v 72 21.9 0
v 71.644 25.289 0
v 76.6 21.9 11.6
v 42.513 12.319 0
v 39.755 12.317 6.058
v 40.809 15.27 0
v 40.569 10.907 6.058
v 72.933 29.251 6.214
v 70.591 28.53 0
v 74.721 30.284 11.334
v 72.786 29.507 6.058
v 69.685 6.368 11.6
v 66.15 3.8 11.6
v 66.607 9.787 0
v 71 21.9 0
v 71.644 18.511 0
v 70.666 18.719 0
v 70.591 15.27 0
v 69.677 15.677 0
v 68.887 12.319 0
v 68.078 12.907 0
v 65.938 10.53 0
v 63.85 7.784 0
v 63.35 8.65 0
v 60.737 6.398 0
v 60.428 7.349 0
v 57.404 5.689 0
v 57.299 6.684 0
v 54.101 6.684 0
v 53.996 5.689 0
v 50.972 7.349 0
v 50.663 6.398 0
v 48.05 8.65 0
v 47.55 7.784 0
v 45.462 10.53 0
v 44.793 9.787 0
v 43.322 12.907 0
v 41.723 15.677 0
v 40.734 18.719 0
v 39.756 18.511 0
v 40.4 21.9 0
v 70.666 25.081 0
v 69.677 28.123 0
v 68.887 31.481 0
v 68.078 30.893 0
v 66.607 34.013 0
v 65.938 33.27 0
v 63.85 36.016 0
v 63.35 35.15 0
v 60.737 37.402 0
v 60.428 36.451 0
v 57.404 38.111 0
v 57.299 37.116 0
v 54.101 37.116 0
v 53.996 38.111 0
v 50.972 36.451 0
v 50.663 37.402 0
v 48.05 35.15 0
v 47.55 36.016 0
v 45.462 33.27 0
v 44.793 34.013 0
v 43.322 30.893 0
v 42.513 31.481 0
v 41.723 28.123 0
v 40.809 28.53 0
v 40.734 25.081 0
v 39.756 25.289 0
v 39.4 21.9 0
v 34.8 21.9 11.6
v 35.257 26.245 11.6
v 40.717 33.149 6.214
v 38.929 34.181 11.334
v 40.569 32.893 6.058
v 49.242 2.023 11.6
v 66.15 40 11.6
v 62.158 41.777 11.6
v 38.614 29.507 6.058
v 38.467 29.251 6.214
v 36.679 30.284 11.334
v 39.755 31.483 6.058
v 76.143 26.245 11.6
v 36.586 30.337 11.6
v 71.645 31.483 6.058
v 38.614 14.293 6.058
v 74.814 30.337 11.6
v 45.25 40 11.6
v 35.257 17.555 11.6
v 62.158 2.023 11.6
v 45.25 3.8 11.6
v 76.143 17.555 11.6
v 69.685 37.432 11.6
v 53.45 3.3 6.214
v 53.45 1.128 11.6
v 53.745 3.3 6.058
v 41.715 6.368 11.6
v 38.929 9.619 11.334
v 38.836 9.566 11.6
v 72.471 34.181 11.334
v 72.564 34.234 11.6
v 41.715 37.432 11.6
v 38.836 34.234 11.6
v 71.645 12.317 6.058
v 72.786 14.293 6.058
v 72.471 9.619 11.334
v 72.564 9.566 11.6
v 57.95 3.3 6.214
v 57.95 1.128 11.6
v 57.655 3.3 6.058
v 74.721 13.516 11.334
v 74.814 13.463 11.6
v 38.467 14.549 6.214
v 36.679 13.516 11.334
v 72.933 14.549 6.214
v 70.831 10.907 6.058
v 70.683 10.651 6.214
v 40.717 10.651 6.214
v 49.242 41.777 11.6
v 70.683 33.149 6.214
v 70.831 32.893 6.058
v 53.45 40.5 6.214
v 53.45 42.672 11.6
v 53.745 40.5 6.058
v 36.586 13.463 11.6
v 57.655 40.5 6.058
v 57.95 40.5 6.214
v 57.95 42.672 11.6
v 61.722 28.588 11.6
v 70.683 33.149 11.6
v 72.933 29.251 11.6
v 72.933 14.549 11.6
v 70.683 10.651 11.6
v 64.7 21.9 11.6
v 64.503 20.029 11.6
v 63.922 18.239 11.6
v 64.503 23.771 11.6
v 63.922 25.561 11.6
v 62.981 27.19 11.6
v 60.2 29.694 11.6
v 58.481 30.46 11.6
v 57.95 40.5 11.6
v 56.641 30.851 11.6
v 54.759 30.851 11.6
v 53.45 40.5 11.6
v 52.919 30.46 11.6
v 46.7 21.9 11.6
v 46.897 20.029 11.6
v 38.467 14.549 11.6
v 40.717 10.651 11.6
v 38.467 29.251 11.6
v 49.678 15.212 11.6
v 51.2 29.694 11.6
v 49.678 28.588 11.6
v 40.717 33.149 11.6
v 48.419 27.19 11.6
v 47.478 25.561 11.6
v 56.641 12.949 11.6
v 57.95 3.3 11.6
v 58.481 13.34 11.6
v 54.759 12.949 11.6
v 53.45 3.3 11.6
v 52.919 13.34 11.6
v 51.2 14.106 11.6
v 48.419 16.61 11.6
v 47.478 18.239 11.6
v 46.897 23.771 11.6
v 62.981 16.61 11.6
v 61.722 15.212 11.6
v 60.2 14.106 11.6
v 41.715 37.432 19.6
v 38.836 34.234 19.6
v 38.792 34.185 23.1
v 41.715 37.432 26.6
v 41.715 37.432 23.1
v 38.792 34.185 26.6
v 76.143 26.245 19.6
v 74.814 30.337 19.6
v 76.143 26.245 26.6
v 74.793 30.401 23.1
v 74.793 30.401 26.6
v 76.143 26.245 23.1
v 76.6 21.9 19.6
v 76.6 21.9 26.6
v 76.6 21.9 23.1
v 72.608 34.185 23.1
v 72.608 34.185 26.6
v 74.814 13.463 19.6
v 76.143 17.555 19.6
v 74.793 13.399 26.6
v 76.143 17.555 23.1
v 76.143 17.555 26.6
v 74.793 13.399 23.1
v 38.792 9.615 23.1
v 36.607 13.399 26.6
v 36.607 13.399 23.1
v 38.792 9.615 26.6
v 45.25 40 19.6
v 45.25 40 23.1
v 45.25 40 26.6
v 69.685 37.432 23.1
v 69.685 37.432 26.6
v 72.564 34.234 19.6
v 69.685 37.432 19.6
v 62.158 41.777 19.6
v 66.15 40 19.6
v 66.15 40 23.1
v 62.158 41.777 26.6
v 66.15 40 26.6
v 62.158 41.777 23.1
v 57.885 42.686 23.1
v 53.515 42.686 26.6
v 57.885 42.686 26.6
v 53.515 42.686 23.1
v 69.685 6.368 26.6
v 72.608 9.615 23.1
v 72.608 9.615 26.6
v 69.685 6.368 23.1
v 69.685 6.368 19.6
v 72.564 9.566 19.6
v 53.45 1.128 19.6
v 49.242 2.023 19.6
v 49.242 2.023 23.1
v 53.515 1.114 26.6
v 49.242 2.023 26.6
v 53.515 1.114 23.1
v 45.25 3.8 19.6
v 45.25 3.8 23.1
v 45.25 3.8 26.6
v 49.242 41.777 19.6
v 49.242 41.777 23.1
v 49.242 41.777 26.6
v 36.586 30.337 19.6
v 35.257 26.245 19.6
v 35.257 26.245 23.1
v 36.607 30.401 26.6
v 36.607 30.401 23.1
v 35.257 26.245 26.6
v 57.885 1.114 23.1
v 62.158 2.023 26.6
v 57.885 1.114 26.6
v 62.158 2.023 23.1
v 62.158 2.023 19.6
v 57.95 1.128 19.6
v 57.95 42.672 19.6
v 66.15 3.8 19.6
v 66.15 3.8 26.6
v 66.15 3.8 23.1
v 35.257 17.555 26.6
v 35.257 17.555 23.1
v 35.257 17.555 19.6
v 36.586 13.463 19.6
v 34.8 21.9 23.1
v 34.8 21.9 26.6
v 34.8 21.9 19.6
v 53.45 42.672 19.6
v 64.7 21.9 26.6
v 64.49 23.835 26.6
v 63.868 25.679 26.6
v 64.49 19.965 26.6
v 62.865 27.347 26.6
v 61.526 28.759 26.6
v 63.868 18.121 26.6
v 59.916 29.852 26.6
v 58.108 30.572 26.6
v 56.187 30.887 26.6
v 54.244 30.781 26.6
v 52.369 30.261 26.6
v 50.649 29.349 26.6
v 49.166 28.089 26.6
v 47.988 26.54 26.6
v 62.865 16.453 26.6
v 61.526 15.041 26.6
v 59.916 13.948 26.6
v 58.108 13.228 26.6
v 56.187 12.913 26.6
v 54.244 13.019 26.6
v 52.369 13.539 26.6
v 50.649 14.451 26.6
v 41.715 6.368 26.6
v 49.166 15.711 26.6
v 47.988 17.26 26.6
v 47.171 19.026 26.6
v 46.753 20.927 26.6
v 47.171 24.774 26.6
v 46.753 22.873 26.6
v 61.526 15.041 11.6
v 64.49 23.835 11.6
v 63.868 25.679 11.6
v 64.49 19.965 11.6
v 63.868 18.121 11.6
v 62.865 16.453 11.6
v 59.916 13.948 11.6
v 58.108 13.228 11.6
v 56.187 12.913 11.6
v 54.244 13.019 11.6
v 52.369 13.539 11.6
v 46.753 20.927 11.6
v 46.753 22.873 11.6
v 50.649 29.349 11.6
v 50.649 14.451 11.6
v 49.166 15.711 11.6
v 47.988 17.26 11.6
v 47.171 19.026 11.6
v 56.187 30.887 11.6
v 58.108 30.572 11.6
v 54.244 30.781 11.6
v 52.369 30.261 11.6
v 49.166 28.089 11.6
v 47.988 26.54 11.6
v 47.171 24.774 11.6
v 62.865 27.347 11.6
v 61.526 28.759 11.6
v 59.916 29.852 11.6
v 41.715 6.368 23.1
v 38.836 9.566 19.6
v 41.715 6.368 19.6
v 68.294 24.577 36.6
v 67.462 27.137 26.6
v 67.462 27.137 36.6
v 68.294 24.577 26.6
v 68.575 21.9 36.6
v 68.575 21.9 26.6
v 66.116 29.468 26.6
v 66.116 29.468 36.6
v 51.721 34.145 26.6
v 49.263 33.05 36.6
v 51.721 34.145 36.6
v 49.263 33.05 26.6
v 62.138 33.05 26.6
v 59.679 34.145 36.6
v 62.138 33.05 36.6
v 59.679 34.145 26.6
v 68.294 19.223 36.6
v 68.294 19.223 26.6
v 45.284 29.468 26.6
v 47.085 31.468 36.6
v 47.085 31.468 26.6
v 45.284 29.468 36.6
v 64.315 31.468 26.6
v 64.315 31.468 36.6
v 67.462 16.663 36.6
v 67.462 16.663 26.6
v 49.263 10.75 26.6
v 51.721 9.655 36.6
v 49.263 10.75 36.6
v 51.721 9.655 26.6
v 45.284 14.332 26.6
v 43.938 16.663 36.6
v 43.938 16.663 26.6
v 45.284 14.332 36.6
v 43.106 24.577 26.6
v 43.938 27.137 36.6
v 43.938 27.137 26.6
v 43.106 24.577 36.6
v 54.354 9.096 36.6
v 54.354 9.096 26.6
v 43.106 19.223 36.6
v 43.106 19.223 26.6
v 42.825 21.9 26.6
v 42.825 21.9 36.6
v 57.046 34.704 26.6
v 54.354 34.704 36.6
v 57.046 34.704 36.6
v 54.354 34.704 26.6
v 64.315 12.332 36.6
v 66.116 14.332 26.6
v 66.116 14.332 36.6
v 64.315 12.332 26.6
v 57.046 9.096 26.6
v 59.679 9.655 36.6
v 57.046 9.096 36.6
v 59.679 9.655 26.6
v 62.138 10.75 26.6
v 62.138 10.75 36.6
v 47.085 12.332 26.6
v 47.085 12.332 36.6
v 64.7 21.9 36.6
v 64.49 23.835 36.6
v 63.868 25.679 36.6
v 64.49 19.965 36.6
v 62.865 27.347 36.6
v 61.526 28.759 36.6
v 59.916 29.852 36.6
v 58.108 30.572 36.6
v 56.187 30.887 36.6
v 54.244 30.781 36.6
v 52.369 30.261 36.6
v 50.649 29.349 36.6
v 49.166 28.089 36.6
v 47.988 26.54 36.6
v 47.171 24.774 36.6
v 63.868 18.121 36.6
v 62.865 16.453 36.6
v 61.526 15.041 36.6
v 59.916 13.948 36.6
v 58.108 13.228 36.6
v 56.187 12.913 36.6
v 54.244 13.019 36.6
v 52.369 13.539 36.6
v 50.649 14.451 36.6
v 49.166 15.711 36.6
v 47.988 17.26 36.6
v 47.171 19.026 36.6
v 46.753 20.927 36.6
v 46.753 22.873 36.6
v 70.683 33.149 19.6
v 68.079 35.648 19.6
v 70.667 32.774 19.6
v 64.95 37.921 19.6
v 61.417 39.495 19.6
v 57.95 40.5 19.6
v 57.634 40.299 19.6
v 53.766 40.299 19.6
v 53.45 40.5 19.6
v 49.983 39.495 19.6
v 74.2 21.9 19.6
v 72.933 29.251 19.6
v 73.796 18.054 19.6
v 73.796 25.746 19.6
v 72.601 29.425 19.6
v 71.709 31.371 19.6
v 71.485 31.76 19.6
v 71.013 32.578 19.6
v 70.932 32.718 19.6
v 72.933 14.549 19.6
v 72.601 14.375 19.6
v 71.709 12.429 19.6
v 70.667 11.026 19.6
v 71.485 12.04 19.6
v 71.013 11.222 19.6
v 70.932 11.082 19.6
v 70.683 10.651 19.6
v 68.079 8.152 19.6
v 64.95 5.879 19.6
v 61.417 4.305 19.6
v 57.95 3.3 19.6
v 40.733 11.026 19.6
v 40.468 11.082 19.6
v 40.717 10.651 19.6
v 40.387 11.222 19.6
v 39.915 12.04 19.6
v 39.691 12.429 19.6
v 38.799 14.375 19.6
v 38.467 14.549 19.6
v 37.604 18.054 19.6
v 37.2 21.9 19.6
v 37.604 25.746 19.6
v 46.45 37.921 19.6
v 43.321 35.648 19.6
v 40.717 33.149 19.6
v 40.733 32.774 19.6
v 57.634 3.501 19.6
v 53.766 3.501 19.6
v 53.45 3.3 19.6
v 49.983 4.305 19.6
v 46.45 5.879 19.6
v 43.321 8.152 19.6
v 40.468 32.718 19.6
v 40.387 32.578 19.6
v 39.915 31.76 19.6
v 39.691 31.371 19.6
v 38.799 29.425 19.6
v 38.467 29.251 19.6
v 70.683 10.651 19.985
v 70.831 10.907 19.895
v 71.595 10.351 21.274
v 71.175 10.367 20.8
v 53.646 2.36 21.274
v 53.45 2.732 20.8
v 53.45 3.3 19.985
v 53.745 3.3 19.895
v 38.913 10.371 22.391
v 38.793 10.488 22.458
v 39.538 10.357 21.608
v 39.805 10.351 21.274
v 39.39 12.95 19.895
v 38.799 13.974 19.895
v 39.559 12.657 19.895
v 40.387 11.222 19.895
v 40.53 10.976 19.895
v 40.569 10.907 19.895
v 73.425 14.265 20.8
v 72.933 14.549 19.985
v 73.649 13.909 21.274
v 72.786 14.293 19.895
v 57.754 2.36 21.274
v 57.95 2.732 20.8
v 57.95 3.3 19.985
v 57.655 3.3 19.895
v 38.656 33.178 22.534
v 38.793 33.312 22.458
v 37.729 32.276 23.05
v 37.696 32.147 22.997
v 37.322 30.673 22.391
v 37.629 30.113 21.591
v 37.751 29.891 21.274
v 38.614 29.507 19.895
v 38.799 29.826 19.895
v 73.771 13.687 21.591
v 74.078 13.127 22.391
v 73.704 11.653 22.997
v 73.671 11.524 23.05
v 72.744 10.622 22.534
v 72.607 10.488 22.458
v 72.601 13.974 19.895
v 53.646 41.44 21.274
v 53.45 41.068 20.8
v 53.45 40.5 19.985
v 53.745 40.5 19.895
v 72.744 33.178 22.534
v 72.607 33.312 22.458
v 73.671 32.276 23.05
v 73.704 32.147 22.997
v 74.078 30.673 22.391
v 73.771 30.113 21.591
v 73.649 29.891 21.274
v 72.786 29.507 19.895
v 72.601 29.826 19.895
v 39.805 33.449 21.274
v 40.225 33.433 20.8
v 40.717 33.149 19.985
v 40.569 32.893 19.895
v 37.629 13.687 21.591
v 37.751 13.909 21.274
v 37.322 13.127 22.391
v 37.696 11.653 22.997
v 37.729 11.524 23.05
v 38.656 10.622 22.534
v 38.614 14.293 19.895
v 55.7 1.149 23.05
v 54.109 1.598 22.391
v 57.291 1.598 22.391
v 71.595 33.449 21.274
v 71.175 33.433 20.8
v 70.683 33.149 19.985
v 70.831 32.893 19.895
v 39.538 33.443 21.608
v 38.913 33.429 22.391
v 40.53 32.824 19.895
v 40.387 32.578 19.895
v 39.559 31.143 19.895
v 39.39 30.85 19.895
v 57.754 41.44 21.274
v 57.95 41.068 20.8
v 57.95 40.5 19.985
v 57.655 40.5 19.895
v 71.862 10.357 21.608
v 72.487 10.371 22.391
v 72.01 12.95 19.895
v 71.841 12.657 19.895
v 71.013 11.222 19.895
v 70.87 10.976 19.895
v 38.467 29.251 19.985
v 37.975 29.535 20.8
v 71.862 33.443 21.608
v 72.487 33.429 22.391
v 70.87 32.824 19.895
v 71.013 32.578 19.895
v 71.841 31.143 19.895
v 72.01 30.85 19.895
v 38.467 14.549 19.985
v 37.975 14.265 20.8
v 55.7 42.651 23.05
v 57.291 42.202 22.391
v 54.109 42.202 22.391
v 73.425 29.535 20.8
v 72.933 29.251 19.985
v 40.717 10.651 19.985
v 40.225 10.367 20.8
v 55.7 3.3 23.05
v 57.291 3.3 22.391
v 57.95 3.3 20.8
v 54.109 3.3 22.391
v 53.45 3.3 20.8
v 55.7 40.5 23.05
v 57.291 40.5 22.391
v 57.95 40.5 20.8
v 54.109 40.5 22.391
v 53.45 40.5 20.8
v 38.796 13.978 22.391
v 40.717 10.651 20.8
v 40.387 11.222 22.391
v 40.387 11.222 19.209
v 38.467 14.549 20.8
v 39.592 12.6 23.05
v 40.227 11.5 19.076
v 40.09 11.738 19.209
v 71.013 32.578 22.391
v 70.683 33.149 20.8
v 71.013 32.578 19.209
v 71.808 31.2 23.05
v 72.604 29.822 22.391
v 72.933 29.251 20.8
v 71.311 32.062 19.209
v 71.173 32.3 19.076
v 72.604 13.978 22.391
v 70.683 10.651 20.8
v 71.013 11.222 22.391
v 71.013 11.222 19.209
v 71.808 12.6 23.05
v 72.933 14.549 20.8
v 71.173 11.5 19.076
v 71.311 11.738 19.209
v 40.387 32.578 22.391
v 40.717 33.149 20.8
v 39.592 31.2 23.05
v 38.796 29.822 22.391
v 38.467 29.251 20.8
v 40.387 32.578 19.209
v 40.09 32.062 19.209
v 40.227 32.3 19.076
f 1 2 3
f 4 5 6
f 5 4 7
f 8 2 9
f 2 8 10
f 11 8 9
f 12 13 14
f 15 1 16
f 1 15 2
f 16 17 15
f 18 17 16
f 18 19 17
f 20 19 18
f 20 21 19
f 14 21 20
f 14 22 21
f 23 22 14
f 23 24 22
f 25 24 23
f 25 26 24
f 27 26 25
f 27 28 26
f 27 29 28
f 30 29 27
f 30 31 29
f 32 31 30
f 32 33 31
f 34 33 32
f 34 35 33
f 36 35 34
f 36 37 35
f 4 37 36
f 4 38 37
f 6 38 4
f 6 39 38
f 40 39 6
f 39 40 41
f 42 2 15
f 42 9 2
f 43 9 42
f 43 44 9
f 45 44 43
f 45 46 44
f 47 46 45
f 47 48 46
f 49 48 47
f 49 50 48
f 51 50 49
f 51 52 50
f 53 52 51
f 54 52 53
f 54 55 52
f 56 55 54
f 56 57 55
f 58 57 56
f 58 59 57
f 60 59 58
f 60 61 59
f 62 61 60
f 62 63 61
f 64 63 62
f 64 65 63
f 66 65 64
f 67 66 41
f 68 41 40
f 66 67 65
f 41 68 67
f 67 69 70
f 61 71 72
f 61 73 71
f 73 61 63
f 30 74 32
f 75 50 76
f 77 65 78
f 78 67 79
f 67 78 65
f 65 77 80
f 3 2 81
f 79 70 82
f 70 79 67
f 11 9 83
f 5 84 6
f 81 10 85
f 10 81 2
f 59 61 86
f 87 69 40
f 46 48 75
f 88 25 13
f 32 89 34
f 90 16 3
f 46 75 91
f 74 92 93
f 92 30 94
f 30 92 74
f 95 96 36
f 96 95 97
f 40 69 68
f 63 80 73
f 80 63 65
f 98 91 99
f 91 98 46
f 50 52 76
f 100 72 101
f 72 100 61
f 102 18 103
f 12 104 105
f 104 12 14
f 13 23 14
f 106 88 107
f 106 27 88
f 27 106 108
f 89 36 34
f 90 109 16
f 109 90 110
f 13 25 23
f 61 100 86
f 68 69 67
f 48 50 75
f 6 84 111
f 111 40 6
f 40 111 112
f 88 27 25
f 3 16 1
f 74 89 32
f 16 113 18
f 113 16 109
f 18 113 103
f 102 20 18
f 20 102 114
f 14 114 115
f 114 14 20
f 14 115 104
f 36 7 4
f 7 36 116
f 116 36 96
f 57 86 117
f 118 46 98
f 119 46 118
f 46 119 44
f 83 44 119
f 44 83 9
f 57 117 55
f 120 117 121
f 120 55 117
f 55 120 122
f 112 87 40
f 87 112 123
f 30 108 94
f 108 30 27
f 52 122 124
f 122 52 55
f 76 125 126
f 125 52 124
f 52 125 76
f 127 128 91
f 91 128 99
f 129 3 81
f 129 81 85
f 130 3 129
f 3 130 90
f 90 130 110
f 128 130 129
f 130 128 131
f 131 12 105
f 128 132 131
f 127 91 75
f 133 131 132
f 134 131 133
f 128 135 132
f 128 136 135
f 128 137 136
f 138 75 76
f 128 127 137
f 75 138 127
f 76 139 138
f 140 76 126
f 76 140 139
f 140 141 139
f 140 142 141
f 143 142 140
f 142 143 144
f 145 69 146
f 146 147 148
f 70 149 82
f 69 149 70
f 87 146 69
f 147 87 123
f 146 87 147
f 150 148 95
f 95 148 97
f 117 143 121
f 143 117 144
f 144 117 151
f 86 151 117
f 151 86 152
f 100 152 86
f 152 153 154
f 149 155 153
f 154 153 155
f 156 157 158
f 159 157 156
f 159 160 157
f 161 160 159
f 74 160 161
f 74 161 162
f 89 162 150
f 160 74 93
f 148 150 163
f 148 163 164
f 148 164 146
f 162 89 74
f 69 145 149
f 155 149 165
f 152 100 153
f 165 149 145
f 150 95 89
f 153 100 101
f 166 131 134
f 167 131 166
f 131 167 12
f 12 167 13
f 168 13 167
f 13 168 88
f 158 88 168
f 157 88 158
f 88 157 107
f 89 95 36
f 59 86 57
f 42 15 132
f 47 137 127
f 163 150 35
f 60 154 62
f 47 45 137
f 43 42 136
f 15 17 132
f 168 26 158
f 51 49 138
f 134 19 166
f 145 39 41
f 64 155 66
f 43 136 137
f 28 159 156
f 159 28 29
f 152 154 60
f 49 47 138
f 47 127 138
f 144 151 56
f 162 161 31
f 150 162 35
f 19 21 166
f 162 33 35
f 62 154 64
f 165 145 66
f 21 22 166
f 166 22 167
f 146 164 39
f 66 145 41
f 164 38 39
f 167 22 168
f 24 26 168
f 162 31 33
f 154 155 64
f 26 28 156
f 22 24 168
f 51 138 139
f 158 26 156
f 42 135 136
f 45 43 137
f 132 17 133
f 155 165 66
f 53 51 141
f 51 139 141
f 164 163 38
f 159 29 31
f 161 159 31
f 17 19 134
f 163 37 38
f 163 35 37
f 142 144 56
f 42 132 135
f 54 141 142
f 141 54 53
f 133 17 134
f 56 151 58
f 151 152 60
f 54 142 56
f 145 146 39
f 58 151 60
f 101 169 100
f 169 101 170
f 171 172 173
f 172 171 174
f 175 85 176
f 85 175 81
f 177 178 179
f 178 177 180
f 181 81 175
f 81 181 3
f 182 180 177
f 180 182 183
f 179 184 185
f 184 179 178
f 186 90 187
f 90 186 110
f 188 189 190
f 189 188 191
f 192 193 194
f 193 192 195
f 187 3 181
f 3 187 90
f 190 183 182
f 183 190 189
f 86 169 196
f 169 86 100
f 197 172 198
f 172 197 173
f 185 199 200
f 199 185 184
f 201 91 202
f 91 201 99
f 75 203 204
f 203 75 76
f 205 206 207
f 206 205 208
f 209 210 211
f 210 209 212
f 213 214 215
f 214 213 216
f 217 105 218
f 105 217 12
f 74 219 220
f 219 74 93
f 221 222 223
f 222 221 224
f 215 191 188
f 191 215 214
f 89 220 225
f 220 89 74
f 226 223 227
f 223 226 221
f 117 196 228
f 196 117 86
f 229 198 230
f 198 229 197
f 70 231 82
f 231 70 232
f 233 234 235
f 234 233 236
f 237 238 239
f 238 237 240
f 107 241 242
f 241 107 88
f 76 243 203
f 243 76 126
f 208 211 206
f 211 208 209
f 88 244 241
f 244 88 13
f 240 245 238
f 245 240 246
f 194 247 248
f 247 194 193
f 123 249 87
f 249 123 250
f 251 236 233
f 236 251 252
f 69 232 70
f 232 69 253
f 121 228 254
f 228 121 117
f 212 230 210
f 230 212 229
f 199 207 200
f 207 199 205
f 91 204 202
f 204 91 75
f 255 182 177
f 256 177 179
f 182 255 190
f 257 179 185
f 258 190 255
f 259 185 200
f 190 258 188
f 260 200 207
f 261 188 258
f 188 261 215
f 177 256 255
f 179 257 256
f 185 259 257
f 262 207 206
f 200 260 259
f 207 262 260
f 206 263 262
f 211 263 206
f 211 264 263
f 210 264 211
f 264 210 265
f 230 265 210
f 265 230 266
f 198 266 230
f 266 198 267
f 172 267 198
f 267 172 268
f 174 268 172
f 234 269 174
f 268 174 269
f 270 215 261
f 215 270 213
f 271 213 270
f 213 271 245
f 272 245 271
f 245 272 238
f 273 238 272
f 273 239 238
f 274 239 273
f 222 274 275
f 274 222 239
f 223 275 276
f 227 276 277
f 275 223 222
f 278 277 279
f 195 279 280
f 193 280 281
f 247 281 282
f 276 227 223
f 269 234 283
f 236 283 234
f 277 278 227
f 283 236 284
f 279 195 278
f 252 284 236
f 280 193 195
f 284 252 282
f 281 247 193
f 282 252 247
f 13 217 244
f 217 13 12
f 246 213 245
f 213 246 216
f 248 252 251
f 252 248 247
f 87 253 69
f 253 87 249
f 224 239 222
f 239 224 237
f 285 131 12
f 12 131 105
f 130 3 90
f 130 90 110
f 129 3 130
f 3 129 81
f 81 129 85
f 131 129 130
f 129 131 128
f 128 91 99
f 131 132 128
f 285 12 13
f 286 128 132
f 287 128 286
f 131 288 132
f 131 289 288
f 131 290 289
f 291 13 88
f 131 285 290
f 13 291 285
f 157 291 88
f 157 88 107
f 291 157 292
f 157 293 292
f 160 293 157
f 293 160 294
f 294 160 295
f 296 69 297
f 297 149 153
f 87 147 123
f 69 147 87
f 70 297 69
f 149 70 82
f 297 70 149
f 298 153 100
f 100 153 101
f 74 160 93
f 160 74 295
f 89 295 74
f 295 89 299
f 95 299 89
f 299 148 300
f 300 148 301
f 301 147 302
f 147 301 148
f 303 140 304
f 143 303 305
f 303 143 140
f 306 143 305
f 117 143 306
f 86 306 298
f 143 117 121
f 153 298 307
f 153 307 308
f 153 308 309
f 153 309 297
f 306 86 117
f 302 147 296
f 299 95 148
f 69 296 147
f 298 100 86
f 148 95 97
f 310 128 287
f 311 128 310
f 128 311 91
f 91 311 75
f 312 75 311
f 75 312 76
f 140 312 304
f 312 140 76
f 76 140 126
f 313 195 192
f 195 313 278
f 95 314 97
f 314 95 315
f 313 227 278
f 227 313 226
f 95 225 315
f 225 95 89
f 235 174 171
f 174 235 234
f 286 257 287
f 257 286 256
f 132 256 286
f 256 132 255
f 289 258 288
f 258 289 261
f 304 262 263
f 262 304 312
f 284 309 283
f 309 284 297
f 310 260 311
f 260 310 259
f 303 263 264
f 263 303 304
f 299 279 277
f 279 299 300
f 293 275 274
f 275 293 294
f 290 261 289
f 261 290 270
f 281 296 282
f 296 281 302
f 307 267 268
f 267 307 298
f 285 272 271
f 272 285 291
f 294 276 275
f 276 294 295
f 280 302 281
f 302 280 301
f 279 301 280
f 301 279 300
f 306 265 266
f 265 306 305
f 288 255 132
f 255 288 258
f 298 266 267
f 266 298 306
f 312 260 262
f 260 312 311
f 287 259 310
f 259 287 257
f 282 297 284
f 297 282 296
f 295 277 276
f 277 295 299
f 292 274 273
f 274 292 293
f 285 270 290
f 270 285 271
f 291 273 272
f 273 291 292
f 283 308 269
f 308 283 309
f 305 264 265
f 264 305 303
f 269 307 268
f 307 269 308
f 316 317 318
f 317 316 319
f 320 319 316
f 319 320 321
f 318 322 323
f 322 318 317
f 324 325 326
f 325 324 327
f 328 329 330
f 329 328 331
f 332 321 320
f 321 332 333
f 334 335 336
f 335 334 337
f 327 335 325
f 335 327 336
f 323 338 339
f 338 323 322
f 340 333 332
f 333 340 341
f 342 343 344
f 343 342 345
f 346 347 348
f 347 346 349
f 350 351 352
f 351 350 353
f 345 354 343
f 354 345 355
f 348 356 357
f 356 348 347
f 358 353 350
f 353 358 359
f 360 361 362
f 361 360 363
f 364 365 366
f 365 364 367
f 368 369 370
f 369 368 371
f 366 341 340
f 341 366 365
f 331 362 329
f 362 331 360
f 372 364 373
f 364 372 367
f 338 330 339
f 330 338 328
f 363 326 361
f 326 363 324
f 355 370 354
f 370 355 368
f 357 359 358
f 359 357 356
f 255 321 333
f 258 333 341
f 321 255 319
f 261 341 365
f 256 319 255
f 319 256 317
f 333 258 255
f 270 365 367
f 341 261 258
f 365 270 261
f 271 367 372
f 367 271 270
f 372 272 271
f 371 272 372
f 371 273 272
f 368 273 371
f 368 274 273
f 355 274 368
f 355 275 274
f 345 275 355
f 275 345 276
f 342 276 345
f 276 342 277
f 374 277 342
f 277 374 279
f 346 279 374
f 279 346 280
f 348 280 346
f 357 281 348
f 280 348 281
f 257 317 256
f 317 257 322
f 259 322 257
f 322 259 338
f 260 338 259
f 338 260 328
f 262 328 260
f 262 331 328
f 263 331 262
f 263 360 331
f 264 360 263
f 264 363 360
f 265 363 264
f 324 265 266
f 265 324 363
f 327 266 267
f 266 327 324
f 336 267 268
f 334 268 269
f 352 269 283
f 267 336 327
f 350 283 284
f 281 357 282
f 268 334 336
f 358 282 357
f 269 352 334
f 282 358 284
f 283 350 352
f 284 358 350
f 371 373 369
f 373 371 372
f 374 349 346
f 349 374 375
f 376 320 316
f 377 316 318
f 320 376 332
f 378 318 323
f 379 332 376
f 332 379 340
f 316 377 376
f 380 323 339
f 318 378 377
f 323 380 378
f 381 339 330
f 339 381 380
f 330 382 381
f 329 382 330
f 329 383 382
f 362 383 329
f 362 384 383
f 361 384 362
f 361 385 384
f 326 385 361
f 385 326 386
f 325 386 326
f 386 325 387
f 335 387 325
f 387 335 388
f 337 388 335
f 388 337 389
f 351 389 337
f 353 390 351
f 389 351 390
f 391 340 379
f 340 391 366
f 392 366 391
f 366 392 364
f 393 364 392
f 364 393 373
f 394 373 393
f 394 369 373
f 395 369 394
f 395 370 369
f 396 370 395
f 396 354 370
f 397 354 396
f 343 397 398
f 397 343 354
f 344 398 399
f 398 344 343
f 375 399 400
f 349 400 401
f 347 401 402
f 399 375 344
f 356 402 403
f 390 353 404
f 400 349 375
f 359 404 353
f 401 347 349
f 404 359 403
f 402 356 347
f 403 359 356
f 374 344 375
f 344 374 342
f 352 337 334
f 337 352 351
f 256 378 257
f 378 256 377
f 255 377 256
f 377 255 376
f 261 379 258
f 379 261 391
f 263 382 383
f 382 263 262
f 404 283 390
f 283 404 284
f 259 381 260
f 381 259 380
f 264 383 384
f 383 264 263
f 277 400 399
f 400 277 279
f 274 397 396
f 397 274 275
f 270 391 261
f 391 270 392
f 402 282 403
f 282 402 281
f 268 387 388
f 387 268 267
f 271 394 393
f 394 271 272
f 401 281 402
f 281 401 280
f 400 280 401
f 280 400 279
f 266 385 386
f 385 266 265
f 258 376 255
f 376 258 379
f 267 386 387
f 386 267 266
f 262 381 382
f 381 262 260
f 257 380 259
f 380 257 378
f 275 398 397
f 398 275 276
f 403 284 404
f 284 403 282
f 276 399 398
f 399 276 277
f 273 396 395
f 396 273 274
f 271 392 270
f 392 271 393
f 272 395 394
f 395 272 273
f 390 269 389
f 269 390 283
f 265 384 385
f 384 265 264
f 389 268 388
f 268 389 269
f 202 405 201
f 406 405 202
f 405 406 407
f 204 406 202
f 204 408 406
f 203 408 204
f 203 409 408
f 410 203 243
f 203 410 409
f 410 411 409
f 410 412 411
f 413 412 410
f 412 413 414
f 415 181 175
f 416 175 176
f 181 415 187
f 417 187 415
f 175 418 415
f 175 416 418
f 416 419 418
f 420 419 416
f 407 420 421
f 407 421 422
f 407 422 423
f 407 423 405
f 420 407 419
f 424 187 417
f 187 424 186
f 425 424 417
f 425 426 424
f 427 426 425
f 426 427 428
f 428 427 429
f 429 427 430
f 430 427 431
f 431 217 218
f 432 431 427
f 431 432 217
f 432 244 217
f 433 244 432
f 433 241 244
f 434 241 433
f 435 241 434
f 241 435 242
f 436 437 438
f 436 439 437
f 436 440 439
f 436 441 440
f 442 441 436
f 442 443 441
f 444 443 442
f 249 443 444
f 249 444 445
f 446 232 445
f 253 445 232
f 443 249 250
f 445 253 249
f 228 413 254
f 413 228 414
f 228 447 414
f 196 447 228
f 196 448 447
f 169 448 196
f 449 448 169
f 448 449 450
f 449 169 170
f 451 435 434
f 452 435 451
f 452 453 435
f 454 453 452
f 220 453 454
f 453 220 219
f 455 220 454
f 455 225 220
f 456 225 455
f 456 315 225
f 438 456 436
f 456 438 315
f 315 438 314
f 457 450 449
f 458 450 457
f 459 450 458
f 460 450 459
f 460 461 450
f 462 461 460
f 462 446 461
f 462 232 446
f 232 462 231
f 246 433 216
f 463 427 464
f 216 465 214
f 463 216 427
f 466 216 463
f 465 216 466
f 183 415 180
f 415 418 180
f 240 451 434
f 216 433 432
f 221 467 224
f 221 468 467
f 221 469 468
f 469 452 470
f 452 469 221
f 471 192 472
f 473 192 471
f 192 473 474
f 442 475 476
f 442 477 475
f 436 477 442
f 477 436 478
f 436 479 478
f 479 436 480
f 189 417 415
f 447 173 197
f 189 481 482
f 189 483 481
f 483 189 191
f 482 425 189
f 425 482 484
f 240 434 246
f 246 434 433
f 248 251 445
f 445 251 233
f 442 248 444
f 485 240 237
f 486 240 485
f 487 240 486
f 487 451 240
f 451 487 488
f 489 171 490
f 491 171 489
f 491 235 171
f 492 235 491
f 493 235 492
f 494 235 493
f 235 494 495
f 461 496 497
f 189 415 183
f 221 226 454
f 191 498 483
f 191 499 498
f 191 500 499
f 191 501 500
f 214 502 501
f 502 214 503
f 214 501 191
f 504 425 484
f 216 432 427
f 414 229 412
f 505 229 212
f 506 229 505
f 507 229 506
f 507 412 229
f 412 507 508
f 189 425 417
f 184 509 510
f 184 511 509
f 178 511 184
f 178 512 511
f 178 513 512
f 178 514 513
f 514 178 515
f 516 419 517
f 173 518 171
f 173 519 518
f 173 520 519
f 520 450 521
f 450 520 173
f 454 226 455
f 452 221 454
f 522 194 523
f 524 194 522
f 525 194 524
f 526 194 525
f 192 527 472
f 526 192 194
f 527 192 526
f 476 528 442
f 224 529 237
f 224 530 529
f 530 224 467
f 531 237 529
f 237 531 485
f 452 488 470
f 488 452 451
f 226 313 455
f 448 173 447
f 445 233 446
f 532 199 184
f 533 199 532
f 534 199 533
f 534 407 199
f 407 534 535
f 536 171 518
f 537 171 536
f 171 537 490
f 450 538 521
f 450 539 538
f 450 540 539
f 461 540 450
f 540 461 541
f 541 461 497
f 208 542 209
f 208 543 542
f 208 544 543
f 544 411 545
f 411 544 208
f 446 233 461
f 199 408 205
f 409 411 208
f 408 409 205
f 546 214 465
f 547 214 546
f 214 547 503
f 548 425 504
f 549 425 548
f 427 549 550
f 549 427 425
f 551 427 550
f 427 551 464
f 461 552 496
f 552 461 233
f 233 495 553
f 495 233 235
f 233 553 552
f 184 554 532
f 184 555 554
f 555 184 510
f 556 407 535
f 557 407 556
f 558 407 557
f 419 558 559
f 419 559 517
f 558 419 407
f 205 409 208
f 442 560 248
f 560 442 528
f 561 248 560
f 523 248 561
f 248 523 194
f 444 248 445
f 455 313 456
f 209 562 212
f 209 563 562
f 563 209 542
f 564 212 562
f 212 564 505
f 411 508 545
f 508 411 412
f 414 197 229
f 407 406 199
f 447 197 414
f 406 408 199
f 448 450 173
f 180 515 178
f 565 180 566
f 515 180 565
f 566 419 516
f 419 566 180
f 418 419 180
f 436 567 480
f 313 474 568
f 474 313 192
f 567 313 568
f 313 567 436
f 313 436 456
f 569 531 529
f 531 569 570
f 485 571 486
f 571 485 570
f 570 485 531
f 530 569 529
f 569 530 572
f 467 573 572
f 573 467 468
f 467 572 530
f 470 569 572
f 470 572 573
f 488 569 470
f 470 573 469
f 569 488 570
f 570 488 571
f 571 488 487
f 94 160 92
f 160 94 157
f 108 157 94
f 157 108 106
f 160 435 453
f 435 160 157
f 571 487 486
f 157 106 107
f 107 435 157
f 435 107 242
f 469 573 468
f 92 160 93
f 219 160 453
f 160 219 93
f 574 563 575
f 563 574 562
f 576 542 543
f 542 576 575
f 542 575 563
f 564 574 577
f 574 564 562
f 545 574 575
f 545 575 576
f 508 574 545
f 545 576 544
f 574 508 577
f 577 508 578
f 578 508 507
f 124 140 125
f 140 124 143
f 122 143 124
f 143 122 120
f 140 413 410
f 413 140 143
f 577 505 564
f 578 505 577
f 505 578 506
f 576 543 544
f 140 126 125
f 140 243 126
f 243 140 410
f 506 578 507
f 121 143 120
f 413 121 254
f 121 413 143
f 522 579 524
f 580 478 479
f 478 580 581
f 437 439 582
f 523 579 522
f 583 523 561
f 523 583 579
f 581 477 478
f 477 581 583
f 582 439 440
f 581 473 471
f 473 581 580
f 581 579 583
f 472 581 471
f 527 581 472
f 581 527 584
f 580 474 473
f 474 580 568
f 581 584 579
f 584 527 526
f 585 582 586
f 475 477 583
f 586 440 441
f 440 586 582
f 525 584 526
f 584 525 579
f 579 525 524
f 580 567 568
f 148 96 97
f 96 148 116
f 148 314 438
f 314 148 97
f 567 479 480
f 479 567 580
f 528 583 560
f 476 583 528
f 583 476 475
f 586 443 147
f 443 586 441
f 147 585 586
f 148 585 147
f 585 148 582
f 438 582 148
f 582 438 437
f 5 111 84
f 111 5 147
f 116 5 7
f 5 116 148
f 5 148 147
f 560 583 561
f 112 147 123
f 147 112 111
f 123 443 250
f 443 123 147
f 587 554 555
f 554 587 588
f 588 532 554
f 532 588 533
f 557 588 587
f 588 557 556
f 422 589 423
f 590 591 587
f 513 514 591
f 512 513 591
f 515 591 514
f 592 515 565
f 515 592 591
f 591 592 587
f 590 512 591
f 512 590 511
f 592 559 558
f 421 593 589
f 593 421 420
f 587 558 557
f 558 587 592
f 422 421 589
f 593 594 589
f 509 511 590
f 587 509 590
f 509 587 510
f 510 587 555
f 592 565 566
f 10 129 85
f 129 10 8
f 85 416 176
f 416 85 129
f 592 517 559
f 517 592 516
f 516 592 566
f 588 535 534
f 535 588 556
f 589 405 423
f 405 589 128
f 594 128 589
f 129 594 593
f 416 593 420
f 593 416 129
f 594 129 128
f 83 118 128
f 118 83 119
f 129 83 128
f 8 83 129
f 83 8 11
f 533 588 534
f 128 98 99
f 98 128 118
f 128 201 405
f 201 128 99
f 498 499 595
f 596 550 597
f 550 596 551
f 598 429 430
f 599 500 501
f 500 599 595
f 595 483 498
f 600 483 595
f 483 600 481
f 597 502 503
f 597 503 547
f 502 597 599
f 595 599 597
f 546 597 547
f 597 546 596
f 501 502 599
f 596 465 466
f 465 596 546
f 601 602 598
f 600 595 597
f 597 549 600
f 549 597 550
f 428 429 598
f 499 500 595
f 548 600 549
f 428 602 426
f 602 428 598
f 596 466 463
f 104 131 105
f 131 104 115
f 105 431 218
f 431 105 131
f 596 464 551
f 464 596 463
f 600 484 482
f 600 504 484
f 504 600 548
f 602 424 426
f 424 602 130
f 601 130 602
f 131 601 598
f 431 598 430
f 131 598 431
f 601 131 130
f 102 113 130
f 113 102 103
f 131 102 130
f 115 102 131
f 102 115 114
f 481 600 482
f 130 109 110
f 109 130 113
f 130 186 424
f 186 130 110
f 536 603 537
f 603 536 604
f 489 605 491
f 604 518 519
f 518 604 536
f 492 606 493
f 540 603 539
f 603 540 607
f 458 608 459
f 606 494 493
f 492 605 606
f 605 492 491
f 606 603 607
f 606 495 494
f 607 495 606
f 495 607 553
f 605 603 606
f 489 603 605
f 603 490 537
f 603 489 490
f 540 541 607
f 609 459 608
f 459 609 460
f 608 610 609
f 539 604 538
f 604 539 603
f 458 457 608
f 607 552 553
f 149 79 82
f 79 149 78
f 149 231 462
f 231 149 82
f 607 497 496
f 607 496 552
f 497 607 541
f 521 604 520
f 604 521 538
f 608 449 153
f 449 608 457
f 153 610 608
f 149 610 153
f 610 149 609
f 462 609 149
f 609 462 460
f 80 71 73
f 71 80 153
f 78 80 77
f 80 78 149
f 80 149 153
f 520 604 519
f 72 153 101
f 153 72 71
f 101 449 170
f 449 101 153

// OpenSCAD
// Part 2, cap

// max radius 41.8, place (x.y) such that there is 1mm margin
// between all elements

difference() {
	translate([55.7, 21.9, 0])
	union() {
	//base
		difference() {
			cylinder(h = 11.6, r1 = 16.3, r2 = 20.9); //$fn = 100); // r1 = 32.6, r2 = 41.8
			cylinder(h = 11.6, r1 = 15.3, r2 = 9); //$fn = 100); // r1 = 30.6, r2 = 18
		}
		translate([0, 0, 11.6])
		difference() {
			cylinder(h = 15, r = 20.9); //$fn = 100);
			cylinder(h = 15, r = 9); //$fn = 100);
		}
		translate([0, 0, 26.6])
		difference() {
			cylinder(h = 10, r = 12.875); //$fn = 100);
			cylinder(h = 10, r = 9); //$fn = 100);
		}
	}

	translate([55.7, 21.9, 19.6])
	difference() {
		cylinder(h=3.5, r = 20.9); //$fn = 100);
		cylinder(h=3.5, r1 = 18.5, r2 = 20.9); //$fn = 100);
	}

	// 1st groove, S
	translate([55.7, 2.15,0])
	union() {
		translate([0, 0, 20.8])	  
		rotate ([90,0,0]) cylinder 
		(h = 2.3, r=2.25, center = true); //$fn = 100);
		translate([0, 0, 10.4])	  
		cube([4.5, 2.3, 20.8], center = true); //$fn = 100);
	}

	// 2nd groove, N
	// translate([55.7, 2.15,0]) // 2.15 + 39.5 = 41.65
	translate([55.7, 41.65,0]) 
	union() {
		translate([0, 0, 20.8])	  
		rotate ([90,0,0]) cylinder 
		(h = 2.3, r=2.25, center = true); //$fn = 100);
		translate([0, 0, 10.4])	  
		cube([4.5, 2.3, 20.8], center = true); //$fn = 100);
	}

	// 3rd groove, SW
	translate([38.596, 12.025,0]) 
	union() {
		translate([0, 0, 20.8])	  
		rotate ([90,0,120]) cylinder (h = 2.3, r=2.25, center = true); //$fn = 100);

		translate([0, 0, 10.4])	
		rotate ([0,0,120])   
		cube([4.5, 2.3, 20.8], center = true); //$fn = 100);
	}

	// 4th groove, NE
	translate([72.804, 31.775,0]) 
	union() {
		translate([0, 0, 20.8])	  
		rotate ([90,0,120]) cylinder (h = 2.3, r=2.25, center = true); //$fn = 100);

		translate([0, 0, 10.4])	
		rotate ([0,0,120])   
		cube([4.5, 2.3, 20.8], center = true); //$fn = 100);
	}

	// 5th groove, SE
	translate([72.804, 12.025,0]) 
	union() {
		translate([0, 0, 20.8])	  
		rotate ([90,0,60]) cylinder (h = 2.3, r=2.25, center = true); //$fn = 100);

		translate([0, 0, 10.4])	
		rotate ([0,0,60])   
		cube([4.5, 2.3, 20.8], center = true); //$fn = 100);
	}

	// 6th groove, SE
	translate([38.596, 31.775,0]) 
	union() {
		translate([0, 0, 20.8])	  
		rotate ([90,0,60]) cylinder (h = 2.3, r=2.25, center = true); //$fn = 100);

		translate([0, 0, 10.4])	
		rotate ([0,0,60])   
		cube([4.5, 2.3, 20.8], center = true); //$fn = 100);
	}
}
